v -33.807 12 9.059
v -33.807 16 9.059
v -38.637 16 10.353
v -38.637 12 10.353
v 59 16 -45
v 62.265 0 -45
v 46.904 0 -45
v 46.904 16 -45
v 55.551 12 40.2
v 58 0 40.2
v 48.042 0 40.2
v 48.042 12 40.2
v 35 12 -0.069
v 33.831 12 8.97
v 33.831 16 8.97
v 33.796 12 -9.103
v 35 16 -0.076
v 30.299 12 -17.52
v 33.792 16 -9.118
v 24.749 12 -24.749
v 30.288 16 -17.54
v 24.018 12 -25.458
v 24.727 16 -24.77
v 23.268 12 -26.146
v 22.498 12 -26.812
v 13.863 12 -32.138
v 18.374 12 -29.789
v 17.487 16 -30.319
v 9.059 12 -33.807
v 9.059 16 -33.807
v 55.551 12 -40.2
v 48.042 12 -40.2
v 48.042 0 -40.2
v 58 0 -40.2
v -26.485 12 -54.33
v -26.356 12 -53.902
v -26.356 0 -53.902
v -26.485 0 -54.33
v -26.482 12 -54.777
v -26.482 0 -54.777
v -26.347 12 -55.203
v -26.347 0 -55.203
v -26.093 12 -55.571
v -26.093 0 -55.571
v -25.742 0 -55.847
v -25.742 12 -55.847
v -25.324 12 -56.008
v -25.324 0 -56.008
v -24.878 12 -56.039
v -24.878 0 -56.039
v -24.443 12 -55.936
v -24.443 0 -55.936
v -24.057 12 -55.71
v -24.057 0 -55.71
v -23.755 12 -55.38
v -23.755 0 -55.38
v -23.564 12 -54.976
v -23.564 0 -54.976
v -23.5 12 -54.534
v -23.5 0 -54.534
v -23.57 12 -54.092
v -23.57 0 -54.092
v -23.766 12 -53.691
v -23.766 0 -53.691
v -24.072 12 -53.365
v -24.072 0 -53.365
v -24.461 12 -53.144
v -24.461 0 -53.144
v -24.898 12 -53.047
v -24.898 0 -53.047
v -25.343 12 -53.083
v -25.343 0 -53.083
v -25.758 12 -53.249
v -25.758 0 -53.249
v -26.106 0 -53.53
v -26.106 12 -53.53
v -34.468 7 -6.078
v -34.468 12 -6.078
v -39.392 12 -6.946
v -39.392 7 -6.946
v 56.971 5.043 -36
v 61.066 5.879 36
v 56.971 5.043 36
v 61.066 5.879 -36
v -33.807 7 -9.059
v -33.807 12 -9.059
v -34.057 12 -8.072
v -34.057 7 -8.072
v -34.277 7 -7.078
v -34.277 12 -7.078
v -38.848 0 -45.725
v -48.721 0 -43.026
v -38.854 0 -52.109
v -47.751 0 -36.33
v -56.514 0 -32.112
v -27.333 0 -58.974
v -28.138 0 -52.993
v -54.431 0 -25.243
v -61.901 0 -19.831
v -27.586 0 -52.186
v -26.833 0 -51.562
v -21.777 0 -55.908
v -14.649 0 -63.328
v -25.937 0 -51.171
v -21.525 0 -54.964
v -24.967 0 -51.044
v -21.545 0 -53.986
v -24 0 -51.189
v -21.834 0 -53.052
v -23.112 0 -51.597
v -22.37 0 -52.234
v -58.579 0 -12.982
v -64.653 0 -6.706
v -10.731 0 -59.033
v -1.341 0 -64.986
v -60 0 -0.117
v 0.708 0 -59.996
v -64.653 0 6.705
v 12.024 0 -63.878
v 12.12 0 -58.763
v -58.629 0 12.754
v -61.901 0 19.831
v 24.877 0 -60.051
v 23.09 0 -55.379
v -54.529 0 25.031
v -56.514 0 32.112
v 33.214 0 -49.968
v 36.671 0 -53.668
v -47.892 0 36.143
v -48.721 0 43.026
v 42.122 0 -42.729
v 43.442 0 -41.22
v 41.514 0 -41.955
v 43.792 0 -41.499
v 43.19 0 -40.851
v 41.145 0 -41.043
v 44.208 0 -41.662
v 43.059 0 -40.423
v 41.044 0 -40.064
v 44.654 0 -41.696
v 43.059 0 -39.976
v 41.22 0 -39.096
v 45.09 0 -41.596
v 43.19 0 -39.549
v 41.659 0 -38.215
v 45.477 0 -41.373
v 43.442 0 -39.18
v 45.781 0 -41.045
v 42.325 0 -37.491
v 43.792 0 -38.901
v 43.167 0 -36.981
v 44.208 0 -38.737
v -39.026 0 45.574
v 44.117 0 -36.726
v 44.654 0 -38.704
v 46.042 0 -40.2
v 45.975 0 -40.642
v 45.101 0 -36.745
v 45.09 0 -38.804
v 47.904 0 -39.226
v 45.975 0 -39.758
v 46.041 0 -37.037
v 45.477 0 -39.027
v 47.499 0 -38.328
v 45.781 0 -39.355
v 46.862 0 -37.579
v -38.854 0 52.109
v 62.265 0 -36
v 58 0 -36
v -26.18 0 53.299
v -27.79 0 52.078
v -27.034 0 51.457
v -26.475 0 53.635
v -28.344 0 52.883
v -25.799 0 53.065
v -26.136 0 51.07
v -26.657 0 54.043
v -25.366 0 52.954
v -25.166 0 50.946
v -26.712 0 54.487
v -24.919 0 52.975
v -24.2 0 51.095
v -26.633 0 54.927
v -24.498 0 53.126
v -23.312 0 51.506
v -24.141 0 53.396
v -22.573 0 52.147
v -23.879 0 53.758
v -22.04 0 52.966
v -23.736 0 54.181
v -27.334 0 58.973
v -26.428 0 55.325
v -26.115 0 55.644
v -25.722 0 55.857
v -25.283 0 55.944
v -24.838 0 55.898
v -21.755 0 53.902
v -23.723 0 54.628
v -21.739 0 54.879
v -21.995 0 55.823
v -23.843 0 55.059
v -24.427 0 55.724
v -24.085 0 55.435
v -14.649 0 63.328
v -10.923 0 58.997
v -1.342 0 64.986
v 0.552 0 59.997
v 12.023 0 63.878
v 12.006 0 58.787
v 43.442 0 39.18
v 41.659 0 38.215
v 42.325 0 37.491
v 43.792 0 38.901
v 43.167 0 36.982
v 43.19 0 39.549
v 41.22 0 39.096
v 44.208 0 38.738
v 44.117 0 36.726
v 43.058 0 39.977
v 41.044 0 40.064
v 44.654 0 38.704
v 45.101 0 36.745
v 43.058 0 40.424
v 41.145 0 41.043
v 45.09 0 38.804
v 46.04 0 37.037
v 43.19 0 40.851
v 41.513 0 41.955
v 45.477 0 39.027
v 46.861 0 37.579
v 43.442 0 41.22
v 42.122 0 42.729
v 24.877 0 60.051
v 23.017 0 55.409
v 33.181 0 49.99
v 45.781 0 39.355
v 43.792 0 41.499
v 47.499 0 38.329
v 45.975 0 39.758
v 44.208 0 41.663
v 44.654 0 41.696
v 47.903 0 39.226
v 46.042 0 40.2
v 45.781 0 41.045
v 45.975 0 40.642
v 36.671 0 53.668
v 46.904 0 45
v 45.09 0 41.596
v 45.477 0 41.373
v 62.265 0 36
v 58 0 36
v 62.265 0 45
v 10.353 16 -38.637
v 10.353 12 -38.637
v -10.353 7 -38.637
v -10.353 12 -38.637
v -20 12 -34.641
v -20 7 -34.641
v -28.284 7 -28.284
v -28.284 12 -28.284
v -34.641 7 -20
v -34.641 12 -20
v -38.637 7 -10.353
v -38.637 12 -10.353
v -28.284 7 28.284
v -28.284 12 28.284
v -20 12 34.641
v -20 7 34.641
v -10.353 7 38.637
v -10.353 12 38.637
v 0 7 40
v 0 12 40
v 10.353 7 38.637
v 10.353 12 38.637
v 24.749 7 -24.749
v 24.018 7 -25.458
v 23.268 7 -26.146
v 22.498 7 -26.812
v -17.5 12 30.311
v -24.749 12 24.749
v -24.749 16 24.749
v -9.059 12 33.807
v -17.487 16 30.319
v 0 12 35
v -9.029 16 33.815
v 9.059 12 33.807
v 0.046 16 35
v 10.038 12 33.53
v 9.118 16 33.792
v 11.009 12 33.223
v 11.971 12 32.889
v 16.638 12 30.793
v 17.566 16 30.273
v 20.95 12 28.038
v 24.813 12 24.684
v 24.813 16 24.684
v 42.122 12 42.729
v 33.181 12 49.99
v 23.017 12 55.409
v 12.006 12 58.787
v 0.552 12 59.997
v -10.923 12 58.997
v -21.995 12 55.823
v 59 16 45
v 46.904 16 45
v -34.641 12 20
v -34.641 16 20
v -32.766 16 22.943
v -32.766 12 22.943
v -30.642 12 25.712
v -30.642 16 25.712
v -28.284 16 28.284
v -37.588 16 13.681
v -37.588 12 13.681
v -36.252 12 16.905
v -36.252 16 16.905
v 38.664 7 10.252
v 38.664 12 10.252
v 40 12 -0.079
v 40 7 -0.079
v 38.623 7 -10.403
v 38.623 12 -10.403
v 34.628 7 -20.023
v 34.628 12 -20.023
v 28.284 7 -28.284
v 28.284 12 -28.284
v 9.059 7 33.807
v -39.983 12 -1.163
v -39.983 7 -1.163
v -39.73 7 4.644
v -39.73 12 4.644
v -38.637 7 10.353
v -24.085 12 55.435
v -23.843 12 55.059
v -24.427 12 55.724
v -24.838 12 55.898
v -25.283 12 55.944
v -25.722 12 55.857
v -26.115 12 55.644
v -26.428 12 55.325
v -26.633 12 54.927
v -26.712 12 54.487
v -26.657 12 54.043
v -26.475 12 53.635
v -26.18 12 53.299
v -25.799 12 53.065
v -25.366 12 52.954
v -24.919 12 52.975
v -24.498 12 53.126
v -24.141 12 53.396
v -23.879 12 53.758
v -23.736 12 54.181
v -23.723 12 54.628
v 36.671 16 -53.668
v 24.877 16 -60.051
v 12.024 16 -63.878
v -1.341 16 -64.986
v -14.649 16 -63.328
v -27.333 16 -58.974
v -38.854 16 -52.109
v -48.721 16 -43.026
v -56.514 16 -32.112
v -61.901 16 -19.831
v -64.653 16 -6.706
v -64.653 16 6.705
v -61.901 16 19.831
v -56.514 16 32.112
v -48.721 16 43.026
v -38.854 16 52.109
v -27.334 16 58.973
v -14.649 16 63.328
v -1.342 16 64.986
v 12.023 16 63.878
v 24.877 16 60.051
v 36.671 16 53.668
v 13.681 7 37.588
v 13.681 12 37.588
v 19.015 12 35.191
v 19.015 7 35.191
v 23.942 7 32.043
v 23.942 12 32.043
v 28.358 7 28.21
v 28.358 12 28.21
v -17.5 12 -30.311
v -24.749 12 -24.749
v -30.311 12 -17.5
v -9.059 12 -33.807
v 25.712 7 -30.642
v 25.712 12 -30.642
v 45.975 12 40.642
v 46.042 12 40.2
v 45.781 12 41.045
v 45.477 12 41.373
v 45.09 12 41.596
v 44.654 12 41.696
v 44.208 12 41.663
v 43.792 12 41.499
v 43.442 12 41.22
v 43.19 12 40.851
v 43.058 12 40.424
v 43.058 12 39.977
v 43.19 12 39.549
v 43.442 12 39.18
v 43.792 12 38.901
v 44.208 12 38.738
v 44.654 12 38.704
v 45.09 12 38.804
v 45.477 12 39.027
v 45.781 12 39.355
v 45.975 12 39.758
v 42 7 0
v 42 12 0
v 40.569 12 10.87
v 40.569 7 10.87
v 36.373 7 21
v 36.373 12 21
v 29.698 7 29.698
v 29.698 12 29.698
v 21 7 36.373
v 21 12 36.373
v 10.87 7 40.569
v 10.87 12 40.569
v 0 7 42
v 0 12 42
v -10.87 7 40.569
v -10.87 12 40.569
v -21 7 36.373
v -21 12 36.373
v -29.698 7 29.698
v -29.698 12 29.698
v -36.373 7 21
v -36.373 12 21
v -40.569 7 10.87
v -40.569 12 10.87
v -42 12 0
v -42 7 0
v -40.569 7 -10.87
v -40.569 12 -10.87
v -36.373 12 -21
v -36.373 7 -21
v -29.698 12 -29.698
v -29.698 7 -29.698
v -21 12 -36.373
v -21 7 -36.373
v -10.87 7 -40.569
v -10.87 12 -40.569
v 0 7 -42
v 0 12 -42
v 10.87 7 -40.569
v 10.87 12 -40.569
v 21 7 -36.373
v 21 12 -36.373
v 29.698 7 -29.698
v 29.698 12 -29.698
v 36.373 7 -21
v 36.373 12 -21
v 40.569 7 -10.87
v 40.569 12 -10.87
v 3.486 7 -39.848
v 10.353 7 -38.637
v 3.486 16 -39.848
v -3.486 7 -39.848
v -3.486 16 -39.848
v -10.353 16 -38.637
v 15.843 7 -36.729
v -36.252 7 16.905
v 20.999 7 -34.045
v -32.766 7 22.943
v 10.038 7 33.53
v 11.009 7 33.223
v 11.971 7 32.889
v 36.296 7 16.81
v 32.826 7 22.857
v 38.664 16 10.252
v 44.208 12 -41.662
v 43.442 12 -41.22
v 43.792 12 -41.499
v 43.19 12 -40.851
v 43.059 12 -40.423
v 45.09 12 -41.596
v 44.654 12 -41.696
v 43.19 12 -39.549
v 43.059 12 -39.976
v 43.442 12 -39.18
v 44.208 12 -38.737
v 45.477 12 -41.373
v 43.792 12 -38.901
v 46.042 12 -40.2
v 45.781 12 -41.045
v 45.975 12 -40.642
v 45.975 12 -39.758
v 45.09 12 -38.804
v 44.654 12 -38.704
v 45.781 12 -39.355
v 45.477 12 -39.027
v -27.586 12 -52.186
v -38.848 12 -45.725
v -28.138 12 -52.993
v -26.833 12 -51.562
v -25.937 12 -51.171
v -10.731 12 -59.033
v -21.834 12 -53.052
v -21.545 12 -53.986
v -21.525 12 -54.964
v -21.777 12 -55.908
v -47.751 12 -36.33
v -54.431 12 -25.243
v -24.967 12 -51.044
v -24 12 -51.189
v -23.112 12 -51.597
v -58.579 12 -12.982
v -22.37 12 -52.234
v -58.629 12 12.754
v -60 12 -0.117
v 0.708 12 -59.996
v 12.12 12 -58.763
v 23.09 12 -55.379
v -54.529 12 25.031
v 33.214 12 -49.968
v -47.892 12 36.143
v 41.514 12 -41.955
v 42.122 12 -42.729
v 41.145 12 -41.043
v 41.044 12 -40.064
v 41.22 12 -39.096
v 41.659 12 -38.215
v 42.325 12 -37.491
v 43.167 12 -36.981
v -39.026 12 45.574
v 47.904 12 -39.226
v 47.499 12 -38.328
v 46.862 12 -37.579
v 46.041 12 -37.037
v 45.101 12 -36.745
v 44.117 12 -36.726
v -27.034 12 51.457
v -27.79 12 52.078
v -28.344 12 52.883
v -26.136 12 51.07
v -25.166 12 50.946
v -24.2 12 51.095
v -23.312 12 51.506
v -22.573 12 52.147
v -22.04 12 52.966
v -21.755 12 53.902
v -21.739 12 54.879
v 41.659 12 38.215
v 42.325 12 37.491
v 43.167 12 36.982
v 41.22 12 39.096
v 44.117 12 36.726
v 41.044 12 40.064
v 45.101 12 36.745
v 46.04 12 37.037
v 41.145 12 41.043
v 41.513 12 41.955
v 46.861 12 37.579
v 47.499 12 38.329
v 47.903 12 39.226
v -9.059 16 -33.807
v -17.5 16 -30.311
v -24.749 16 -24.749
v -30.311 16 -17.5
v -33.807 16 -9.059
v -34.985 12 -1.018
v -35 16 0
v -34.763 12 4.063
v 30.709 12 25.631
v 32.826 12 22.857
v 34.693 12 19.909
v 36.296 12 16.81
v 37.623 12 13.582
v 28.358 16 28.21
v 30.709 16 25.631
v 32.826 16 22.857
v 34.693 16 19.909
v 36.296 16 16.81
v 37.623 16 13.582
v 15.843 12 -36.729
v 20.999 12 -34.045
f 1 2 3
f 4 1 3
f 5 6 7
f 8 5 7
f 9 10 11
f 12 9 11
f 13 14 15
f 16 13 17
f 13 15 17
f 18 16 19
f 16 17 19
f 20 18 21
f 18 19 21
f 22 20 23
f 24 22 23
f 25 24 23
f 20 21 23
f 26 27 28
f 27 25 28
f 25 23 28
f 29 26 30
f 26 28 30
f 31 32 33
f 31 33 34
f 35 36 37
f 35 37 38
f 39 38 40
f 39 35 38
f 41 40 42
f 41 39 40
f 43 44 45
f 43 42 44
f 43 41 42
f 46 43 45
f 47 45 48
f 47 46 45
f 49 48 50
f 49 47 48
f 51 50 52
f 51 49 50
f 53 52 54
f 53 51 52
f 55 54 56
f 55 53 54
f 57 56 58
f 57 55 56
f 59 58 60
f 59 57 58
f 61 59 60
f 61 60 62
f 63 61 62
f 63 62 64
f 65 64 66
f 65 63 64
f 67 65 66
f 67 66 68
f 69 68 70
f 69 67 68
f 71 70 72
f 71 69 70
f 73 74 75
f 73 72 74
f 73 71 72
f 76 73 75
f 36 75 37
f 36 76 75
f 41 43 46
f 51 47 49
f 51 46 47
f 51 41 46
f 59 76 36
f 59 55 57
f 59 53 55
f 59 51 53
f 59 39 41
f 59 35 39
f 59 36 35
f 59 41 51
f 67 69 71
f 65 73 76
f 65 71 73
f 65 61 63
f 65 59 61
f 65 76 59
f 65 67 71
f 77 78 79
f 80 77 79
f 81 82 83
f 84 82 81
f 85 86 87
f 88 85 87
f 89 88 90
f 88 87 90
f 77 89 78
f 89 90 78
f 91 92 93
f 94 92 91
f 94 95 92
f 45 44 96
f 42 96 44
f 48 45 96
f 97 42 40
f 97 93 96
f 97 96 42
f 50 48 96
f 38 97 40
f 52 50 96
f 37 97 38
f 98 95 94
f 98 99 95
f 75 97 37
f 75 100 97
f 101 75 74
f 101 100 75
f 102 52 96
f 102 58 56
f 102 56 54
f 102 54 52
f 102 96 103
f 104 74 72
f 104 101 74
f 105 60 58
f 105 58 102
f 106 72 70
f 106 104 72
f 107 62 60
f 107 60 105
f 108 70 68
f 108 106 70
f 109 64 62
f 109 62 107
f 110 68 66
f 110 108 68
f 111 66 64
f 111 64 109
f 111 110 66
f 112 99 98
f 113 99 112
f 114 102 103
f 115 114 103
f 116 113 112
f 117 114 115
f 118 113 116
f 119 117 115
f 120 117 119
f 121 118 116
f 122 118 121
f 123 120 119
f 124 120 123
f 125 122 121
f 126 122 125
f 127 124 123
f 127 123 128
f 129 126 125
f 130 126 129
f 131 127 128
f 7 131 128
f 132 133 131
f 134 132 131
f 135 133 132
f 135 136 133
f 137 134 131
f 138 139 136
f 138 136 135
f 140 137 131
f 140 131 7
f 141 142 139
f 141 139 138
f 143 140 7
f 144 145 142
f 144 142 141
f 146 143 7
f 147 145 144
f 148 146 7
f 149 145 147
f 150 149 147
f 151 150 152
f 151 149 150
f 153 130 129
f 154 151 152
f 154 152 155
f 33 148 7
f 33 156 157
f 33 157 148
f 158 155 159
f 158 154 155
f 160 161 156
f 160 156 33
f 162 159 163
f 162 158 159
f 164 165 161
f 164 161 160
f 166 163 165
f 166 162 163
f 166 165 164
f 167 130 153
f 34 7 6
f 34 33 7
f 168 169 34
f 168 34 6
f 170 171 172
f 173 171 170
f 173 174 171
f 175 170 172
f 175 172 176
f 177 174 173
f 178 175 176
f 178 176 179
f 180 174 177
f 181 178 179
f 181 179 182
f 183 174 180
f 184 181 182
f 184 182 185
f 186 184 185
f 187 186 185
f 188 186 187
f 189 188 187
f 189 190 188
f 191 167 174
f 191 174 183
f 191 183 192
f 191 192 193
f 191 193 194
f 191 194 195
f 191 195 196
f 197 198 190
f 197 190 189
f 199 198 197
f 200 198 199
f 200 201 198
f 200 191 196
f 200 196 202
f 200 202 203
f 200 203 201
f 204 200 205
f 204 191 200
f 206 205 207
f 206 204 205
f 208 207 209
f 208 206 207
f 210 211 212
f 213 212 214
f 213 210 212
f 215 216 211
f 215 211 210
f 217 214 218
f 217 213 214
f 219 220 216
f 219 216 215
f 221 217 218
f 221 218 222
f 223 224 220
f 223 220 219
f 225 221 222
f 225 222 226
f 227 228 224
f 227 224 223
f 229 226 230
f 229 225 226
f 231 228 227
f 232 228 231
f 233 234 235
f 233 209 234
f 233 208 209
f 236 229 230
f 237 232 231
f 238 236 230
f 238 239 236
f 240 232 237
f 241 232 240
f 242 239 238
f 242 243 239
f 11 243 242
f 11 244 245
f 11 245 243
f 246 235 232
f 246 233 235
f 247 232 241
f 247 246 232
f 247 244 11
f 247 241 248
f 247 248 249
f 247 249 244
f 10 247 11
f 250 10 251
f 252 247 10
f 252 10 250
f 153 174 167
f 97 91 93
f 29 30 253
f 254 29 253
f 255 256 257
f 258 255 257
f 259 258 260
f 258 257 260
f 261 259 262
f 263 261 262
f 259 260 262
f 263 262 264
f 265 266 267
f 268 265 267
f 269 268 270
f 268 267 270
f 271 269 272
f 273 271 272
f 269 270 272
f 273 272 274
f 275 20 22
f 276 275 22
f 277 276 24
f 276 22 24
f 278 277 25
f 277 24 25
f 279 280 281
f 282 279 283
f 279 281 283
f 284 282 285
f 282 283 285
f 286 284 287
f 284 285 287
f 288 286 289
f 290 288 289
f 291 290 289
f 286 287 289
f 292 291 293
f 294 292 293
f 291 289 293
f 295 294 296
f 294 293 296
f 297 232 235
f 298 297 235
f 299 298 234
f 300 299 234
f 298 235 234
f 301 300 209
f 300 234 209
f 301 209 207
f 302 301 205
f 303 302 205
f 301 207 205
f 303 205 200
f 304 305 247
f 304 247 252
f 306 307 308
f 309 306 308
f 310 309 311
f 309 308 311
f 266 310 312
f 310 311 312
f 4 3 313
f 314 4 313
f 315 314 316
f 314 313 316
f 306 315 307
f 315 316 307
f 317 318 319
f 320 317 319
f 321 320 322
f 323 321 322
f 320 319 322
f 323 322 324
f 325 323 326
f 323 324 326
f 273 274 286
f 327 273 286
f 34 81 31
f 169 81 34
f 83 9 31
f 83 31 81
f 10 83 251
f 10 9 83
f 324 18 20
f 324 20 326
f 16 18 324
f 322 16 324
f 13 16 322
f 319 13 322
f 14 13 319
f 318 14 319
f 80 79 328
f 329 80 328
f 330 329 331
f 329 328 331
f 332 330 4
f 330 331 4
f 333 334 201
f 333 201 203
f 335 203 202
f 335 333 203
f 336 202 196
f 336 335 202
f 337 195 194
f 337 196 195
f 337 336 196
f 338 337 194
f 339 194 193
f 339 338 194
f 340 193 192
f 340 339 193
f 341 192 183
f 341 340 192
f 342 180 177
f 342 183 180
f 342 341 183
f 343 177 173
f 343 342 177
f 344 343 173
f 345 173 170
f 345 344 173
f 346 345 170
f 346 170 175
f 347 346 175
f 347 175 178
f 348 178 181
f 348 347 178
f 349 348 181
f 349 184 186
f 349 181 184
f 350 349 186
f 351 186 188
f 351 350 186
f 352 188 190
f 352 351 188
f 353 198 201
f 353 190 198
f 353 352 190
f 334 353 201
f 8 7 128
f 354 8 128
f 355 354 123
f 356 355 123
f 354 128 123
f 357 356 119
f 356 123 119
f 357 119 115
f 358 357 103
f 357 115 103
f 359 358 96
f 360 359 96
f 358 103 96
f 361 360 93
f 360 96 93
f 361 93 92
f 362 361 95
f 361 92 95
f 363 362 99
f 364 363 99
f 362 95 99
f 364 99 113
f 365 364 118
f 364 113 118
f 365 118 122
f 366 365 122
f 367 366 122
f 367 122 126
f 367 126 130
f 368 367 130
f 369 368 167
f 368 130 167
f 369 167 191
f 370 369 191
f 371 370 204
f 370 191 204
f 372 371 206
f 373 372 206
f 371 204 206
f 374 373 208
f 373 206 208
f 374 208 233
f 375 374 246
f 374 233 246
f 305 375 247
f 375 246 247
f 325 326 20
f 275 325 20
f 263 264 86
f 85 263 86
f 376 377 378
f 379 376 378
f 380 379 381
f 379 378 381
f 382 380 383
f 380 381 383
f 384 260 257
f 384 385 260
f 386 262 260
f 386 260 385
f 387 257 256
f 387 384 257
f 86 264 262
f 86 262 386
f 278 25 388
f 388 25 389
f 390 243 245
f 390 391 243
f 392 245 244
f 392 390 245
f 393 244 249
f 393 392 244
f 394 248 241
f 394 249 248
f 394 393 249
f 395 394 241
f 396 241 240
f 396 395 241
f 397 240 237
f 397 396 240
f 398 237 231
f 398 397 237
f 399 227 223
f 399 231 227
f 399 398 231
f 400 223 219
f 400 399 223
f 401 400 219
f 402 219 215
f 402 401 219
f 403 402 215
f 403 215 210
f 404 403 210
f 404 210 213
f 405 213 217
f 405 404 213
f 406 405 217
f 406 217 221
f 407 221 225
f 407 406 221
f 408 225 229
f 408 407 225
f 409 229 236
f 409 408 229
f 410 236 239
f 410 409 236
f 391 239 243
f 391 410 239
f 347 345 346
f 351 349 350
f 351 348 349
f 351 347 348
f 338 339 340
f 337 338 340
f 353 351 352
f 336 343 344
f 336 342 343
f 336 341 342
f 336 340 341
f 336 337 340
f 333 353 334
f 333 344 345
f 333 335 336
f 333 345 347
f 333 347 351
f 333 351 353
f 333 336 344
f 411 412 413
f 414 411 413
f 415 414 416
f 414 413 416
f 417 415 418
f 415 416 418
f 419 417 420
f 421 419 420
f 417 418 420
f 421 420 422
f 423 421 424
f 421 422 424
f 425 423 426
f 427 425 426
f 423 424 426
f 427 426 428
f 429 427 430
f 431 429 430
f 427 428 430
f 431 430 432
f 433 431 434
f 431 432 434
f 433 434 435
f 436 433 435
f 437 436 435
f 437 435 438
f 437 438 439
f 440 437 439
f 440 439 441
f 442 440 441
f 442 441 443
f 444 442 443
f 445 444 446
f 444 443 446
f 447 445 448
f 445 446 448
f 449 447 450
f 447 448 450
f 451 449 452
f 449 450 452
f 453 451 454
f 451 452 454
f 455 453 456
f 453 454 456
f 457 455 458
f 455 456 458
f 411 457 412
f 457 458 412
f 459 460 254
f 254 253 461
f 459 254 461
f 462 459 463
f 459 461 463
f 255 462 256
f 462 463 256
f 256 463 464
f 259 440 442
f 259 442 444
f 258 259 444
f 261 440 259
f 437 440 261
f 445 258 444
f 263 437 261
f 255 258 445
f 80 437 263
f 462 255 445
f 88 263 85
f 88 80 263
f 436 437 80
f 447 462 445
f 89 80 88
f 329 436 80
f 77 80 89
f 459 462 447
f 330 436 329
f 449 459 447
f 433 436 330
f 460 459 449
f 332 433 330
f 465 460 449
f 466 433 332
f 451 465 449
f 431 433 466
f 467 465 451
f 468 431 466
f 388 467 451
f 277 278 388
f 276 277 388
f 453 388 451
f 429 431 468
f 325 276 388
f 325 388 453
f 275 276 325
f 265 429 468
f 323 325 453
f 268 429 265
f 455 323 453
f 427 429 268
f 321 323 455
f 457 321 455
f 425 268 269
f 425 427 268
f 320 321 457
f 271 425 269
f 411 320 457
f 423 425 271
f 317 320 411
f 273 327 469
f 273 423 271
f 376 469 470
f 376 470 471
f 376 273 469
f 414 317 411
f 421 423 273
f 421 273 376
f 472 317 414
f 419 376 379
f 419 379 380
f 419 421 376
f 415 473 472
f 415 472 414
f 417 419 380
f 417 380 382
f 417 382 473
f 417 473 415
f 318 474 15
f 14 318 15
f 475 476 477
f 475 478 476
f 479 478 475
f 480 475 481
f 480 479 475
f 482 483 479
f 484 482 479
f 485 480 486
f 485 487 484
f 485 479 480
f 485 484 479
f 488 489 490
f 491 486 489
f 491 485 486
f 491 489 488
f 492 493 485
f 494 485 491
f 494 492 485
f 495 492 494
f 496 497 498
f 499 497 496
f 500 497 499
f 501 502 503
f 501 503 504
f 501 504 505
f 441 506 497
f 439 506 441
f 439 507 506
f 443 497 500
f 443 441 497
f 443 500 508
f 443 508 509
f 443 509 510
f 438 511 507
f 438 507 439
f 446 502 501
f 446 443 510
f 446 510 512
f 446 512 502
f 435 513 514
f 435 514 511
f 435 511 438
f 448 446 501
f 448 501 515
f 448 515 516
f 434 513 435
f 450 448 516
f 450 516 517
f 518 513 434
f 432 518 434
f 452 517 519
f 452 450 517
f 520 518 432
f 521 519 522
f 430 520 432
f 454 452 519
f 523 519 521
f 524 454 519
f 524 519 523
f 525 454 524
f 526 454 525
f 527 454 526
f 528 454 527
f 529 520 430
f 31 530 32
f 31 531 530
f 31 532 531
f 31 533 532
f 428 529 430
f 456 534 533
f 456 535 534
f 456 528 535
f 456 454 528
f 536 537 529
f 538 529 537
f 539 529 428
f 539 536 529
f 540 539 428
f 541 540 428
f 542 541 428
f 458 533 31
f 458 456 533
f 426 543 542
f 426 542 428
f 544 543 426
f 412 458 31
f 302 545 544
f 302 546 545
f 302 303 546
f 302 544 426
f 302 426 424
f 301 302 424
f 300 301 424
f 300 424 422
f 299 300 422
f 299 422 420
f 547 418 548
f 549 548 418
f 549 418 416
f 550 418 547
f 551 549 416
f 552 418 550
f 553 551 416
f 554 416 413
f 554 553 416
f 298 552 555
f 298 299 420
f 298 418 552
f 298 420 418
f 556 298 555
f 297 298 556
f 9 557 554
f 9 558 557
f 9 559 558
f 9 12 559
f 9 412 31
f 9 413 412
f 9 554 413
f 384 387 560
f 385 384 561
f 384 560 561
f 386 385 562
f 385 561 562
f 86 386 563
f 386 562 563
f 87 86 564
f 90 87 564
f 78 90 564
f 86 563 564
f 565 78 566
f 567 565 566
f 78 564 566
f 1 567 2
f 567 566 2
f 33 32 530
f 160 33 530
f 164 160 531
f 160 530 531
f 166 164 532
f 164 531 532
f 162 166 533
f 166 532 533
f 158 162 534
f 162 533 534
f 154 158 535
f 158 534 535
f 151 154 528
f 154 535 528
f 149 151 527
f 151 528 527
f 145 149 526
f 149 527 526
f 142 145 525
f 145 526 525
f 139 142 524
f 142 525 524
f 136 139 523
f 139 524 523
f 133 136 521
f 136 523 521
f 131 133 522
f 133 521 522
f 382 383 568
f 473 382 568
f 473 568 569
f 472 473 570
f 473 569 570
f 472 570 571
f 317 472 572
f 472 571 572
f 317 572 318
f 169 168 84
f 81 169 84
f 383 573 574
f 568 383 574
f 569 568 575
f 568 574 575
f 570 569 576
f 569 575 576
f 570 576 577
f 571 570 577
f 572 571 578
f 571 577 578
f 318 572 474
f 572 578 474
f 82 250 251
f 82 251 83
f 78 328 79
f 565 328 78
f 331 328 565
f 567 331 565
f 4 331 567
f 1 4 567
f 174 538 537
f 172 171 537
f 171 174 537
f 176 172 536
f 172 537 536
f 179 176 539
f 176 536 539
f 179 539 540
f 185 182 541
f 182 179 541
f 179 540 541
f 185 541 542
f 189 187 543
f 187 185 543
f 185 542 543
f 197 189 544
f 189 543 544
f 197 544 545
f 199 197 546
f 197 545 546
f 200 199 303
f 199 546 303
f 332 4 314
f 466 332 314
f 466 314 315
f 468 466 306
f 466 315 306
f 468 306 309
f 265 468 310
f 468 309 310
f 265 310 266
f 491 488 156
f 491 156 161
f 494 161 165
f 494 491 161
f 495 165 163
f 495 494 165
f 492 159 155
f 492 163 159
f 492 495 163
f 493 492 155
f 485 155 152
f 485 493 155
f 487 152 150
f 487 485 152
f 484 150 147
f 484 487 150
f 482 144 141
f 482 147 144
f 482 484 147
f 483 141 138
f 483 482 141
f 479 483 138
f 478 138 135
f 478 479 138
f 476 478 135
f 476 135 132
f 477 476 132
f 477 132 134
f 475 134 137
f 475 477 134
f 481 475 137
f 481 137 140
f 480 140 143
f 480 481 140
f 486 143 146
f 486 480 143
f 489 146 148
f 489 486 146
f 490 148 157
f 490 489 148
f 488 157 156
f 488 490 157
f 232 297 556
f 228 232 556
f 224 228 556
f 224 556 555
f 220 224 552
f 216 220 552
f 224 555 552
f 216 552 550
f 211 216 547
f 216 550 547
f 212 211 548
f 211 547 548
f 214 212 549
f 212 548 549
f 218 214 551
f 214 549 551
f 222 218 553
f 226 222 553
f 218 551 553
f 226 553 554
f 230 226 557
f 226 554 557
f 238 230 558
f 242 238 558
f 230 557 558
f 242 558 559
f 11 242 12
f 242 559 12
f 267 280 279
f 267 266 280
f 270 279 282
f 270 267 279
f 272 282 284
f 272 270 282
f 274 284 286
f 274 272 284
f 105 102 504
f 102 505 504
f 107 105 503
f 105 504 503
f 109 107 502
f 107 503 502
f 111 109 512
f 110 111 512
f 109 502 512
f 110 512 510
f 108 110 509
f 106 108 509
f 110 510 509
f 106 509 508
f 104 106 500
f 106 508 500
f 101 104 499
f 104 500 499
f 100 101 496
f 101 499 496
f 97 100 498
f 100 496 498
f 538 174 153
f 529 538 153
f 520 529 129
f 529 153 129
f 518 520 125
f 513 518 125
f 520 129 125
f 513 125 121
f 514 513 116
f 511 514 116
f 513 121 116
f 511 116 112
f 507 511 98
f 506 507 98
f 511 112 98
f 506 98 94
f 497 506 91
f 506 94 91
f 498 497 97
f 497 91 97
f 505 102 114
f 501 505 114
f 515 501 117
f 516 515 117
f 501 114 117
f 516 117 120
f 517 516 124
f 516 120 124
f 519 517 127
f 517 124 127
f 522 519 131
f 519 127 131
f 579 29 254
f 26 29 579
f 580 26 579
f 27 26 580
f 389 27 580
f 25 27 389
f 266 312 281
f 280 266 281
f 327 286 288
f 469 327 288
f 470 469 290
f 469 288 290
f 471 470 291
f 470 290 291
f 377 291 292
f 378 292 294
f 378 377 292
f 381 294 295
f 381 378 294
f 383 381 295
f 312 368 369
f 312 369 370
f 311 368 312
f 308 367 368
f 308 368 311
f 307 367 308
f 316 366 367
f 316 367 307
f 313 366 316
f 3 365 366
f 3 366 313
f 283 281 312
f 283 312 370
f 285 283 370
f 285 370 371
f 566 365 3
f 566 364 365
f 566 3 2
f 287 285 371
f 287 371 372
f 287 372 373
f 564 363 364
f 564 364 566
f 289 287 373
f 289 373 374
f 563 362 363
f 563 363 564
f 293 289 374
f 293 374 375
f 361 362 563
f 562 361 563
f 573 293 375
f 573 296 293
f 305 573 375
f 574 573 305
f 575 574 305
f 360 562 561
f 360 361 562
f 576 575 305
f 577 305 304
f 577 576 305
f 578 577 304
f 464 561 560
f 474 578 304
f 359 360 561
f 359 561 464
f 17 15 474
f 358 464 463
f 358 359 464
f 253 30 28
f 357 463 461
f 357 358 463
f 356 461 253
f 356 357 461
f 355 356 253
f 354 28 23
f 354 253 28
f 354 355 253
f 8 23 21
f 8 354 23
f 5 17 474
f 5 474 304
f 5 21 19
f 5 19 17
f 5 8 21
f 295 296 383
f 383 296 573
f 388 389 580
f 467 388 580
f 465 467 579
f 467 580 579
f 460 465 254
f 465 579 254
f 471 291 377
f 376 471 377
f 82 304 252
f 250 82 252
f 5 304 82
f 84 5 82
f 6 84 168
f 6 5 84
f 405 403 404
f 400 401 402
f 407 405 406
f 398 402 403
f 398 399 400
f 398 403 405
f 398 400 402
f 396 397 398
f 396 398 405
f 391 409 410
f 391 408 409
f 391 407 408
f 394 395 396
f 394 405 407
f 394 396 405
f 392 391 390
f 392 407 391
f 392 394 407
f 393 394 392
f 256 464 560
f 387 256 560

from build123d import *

# Parameters (mm, degrees)
BOSS_EXTRUDE1_DEPTH = 16
CUT_EXTRUDE1_DEPTH  = 12
SKETCH4_W           = 72
SKETCH4_H           = 5
CUT_EXTRUDE2_DEPTH  = 16
SKETCH5_R           = 35
CUT_EXTRUDE3_DEPTH  = 16
CUT_EXTRUDE4_DEPTH  = 10
SKETCH7_R           = 42
BOSS_EXTRUDE2_DEPTH = 5
SKETCH8_R           = 3.5
SKETCH8_R_2         = 1.5
BOSS_EXTRUDE3_DEPTH = 12
SKETCH13_R          = 1.5
CUT_EXTRUDE5_DEPTH  = 12
SKETCH15_W          = 14.23560612
SKETCH15_H          = 16
BOSS_EXTRUDE4_DEPTH = 90
CUT_EXTRUDE6_DEPTH  = 90
CUT_EXTRUDE11_START = -4.8
CUT_EXTRUDE11_DEPTH = 80.4
SKETCH19_W          = 72
SKETCH19_H          = 6
CUT_EXTRUDE14_DEPTH = 8.4


with BuildPart() as part:
    # Sketch1 → Boss-Extrude1 (new body)
    with BuildSketch(Plane(origin=(0, 0, 0), x_dir=(1, 0, 0), z_dir=(0, 1, 0))):
        with BuildLine():
            Line((25, -45.0001724), (25, 44.9998276))
            Line((25, 44.9998276), (46.904322999, 44.9998276))
            ThreePointArc((46.904322999, 44.9998276), (-65, 0.000238913), (46.903992196, -45.0001724))
            Line((46.903992196, -45.0001724), (25, -45.0001724))
        make_face()
        with BuildLine():
            Line((46.904322999, 44.9998276), (25, 44.9998276))
            Line((25, 44.9998276), (25, -45.0001724))
            Line((25, -45.0001724), (46.903992196, -45.0001724))
            ThreePointArc((46.903992196, -45.0001724), (60.306548122, -24.251190767), (65, 0))
            ThreePointArc((65, 0), (60.306637259, 24.250969105), (46.904322999, 44.9998276))
        make_face()
        with BuildLine():
            Line((69, 44.9998276), (46.904322999, 44.9998276))
            ThreePointArc((46.904322999, 44.9998276), (60.306637259, 24.250969105), (65, 0))
            ThreePointArc((65, 0), (60.306548122, -24.251190767), (46.903992196, -45.0001724))
            Line((46.903992196, -45.0001724), (69, -45.0001724))
            Line((69, -45.0001724), (69, 44.9998276))
        make_face()
    extrude(amount=BOSS_EXTRUDE1_DEPTH)

    # Sketch3 → Cut-Extrude1 (cut)
    with BuildSketch(Plane.XZ):
        with BuildLine():
            Line((13.648760289, 40.2001724), (44.541510291, 40.2001724))
            ThreePointArc((44.541510291, 40.2001724), (-60, -0.000232232), (44.541821482, -40.1998276))
            Line((44.541821482, -40.1998276), (13.648760289, -40.1998276))
            Line((13.648760289, -40.1998276), (13.648760289, 40.2001724))
        make_face()
        with BuildLine():
            ThreePointArc((60, 0), (56.002190214, 21.53496439), (44.541510291, 40.2001724))
            Line((44.541510291, 40.2001724), (13.648760289, 40.2001724))
            Line((13.648760289, 40.2001724), (13.648760289, -40.1998276))
            Line((13.648760289, -40.1998276), (44.541821482, -40.1998276))
            ThreePointArc((44.541821482, -40.1998276), (56.002273565, -21.534747631), (60, 0))
        make_face()
        with BuildLine():
            Line((64, -40.1998276), (64, 40.2001724))
            Line((64, 40.2001724), (44.541510291, 40.2001724))
            ThreePointArc((44.541510291, 40.2001724), (56.002190214, 21.53496439), (60, 0))
            ThreePointArc((60, 0), (56.002273565, -21.534747631), (44.541821482, -40.1998276))
            Line((44.541821482, -40.1998276), (64, -40.1998276))
        make_face()
    extrude(amount=-CUT_EXTRUDE1_DEPTH, mode=Mode.SUBTRACT)

    # Sketch4 → Cut-Extrude2 (cut)
    with BuildSketch(Plane(origin=(69, 0, 0), x_dir=(0, 0, -1), z_dir=(1, 0, 0))):
        with Locations((-0.0001724, 2.5)):
            Rectangle(SKETCH4_W, SKETCH4_H)
    extrude(amount=-CUT_EXTRUDE2_DEPTH, mode=Mode.SUBTRACT)

    # Sketch5 → Cut-Extrude3 (cut)
    with BuildSketch(Plane(origin=(0, 16, 0), x_dir=(1, 0, 0), z_dir=(0, 1, 0))):
        Circle(SKETCH5_R)
    extrude(amount=-CUT_EXTRUDE3_DEPTH, mode=Mode.SUBTRACT)

    # Sketch6 → Cut-Extrude4 (cut)
    with BuildSketch(Plane(origin=(0, 16, 0), x_dir=(1, 0, 0), z_dir=(0, 1, 0))):
        with BuildLine():
            Line((-28.284271247, -28.284271247), (-24.748737342, -24.748737342))
            ThreePointArc((-24.748737342, -24.748737342), (-27.76736691, -21.306650015), (-30.310889132, -17.5))
            Line((-30.310889132, -17.5), (-34.641016151, -20))
            ThreePointArc((-34.641016151, -20), (-31.734133612, -24.35045716), (-28.284271247, -28.284271247))
        make_face()
        with BuildLine():
            Line((-34.641016151, -20), (-30.310889132, -17.5))
            ThreePointArc((-30.310889132, -17.5), (-32.335783638, -13.393920133), (-33.80740392, -9.058666579))
            Line((-33.80740392, -9.058666579), (-38.637033052, -10.352761804))
            ThreePointArc((-38.637033052, -10.352761804), (-36.9551813, -15.307337295), (-34.641016151, -20))
        make_face()
        with BuildLine():
            Line((-10.352761804, 38.637033052), (-9.058666579, 33.80740392))
            ThreePointArc((-9.058666579, 33.80740392), (0, 35), (9.058666579, 33.80740392))
            Line((9.058666579, 33.80740392), (10.352761804, 38.637033052))
            ThreePointArc((10.352761804, 38.637033052), (0, 40), (-10.352761804, 38.637033052))
        make_face()
        with BuildLine():
            ThreePointArc((33.831018509, -8.970071717), (32.370760151, -13.309165535), (30.356629112, -17.420535841))
            Line((30.356629112, -17.420535841), (34.693290413, -19.909183818))
            ThreePointArc((34.693290413, -19.909183818), (36.995154458, -15.210474897), (38.664021154, -10.251510534))
            Line((38.664021154, -10.251510534), (33.831018509, -8.970071717))
        make_face()
        with BuildLine():
            ThreePointArc((30.356629112, -17.420535841), (27.823087732, -21.233835948), (24.813485607, -24.683819236))
            Line((24.813485607, -24.683819236), (28.358269265, -28.210079126))
            ThreePointArc((28.358269265, -28.210079126), (31.79781455, -24.267241084), (34.693290413, -19.909183818))
            Line((34.693290413, -19.909183818), (30.356629112, -17.420535841))
        make_face()
    extrude(amount=-CUT_EXTRUDE4_DEPTH, mode=Mode.SUBTRACT)

    # Sketch7 → Boss-Extrude2 (add)
    with BuildSketch(Plane.XZ.offset(-12)):
        Circle(SKETCH7_R)
        with BuildLine():
            ThreePointArc((-28.284271247, 28.284271247), (-10.352761804, 38.637033052), (10.352761804, 38.637033052))
            Line((10.352761804, 38.637033052), (9.058666579, 33.80740392))
            ThreePointArc((9.058666579, 33.80740392), (10.524702983, 33.380093276), (11.970705016, 32.889241728))
            Line((11.970705016, 32.889241728), (13.680805733, 37.587704831))
            ThreePointArc((13.680805733, 37.587704831), (21.53615385, 33.707478063), (28.358269265, 28.210079126))
            ThreePointArc((28.358269265, 28.210079126), (34.693290413, 19.909183818), (38.664021154, 10.251510534))
            ThreePointArc((38.664021154, 10.251510534), (38.623439557, -10.40336084), (28.284271247, -28.284271247))
            Line((28.284271247, -28.284271247), (24.748737342, -24.748737342))
            ThreePointArc((24.748737342, -24.748737342), (23.645657267, -25.804706788), (22.497566339, -26.811555509))
            Line((22.497566339, -26.811555509), (25.711504387, -30.641777725))
            ThreePointArc((25.711504387, -30.641777725), (18.469944529, -35.480433327), (10.352761804, -38.637033052))
            ThreePointArc((10.352761804, -38.637033052), (0, -40), (-10.352761804, -38.637033052))
            ThreePointArc((-10.352761804, -38.637033052), (-28.284271247, -28.284271247), (-38.637033052, -10.352761804))
            Line((-38.637033052, -10.352761804), (-33.80740392, -9.058666579))
            ThreePointArc((-33.80740392, -9.058666579), (-34.170360249, -7.575386488), (-34.468271355, -6.077686218))
            Line((-34.468271355, -6.077686218), (-39.39231012, -6.945927107))
            ThreePointArc((-39.39231012, -6.945927107), (-39.961928863, 1.744775495), (-38.637033052, 10.352761804))
            ThreePointArc((-38.637033052, 10.352761804), (-34.641016151, 20), (-28.284271247, 28.284271247))
        make_face(mode=Mode.SUBTRACT)
    extrude(amount=BOSS_EXTRUDE2_DEPTH)

    # Sketch8 → Boss-Extrude3 (add)
    with BuildSketch(Plane.XZ.offset(-12)):
        with Locations((-25.212285918, 54.445758685)):
            Circle(SKETCH8_R)
        with Locations((-25.212285918, 54.445758685)):
            Circle(SKETCH8_R_2, mode=Mode.SUBTRACT)
        with Locations((-25, -54.543560573)):
            Circle(SKETCH8_R)
        with Locations((-25, -54.543560573)):
            Circle(SKETCH8_R_2, mode=Mode.SUBTRACT)
        with Locations((44.541510291, 40.2001724)):
            Circle(SKETCH8_R)
        with Locations((44.541510291, 40.2001724)):
            Circle(SKETCH8_R_2, mode=Mode.SUBTRACT)
        with Locations((44.541821482, -40.1998276)):
            Circle(SKETCH8_R)
        with Locations((44.541821482, -40.1998276)):
            Circle(SKETCH8_R_2, mode=Mode.SUBTRACT)
    extrude(amount=BOSS_EXTRUDE3_DEPTH)

    # Sketch13 → Cut-Extrude5 (cut)
    with BuildSketch(Plane.XZ.offset(-12)):
        with Locations((44.541510291, 40.2001724)):
            Circle(SKETCH13_R)
        with Locations((-25.212285918, 54.445758685)):
            Circle(SKETCH13_R)
        with Locations((-25, -54.543560573)):
            Circle(SKETCH13_R)
        with Locations((44.541821482, -40.1998276)):
            Circle(SKETCH13_R)
    extrude(amount=CUT_EXTRUDE5_DEPTH, mode=Mode.SUBTRACT)

    # Sketch15 → Boss-Extrude4 (add)
    with BuildSketch(Plane.XY.offset(45.0001724)):
        with Locations((61.88219694, 8)):
            Rectangle(SKETCH15_W, SKETCH15_H)
    extrude(amount=-BOSS_EXTRUDE4_DEPTH)

    # Sketch14 → Cut-Extrude6 (cut)
    with BuildSketch(Plane(origin=(0, 0, -44.9998276), x_dir=(-1, 0, 0), z_dir=(0, 0, -1))):
        Polygon((-69, 16), (-59, 16), (-69, -33), align=None)
    extrude(amount=-CUT_EXTRUDE6_DEPTH, mode=Mode.SUBTRACT)

    # Sketch17 → Cut-Extrude11 (cut)
    with BuildSketch(Plane.XY.offset(45.0001724).offset(CUT_EXTRUDE11_START)):
        Polygon((58.000000002, 0), (54.73469388, 0), (54.73469388, 12), (55.551020411, 12), align=None)
    extrude(amount=-CUT_EXTRUDE11_DEPTH, mode=Mode.SUBTRACT)

    # Sketch19 → Cut-Extrude14 (cut)
    with BuildSketch(Plane(origin=(59.775689724, 12.199120352, 0), x_dir=(0, 0, -1), z_dir=(0.979804059, 0.199960012, 0))):
        with Locations((-0.0001724, -9.450571359)):
            Rectangle(SKETCH19_W, SKETCH19_H)
    extrude(amount=-CUT_EXTRUDE14_DEPTH, mode=Mode.SUBTRACT)


solid = part.part
